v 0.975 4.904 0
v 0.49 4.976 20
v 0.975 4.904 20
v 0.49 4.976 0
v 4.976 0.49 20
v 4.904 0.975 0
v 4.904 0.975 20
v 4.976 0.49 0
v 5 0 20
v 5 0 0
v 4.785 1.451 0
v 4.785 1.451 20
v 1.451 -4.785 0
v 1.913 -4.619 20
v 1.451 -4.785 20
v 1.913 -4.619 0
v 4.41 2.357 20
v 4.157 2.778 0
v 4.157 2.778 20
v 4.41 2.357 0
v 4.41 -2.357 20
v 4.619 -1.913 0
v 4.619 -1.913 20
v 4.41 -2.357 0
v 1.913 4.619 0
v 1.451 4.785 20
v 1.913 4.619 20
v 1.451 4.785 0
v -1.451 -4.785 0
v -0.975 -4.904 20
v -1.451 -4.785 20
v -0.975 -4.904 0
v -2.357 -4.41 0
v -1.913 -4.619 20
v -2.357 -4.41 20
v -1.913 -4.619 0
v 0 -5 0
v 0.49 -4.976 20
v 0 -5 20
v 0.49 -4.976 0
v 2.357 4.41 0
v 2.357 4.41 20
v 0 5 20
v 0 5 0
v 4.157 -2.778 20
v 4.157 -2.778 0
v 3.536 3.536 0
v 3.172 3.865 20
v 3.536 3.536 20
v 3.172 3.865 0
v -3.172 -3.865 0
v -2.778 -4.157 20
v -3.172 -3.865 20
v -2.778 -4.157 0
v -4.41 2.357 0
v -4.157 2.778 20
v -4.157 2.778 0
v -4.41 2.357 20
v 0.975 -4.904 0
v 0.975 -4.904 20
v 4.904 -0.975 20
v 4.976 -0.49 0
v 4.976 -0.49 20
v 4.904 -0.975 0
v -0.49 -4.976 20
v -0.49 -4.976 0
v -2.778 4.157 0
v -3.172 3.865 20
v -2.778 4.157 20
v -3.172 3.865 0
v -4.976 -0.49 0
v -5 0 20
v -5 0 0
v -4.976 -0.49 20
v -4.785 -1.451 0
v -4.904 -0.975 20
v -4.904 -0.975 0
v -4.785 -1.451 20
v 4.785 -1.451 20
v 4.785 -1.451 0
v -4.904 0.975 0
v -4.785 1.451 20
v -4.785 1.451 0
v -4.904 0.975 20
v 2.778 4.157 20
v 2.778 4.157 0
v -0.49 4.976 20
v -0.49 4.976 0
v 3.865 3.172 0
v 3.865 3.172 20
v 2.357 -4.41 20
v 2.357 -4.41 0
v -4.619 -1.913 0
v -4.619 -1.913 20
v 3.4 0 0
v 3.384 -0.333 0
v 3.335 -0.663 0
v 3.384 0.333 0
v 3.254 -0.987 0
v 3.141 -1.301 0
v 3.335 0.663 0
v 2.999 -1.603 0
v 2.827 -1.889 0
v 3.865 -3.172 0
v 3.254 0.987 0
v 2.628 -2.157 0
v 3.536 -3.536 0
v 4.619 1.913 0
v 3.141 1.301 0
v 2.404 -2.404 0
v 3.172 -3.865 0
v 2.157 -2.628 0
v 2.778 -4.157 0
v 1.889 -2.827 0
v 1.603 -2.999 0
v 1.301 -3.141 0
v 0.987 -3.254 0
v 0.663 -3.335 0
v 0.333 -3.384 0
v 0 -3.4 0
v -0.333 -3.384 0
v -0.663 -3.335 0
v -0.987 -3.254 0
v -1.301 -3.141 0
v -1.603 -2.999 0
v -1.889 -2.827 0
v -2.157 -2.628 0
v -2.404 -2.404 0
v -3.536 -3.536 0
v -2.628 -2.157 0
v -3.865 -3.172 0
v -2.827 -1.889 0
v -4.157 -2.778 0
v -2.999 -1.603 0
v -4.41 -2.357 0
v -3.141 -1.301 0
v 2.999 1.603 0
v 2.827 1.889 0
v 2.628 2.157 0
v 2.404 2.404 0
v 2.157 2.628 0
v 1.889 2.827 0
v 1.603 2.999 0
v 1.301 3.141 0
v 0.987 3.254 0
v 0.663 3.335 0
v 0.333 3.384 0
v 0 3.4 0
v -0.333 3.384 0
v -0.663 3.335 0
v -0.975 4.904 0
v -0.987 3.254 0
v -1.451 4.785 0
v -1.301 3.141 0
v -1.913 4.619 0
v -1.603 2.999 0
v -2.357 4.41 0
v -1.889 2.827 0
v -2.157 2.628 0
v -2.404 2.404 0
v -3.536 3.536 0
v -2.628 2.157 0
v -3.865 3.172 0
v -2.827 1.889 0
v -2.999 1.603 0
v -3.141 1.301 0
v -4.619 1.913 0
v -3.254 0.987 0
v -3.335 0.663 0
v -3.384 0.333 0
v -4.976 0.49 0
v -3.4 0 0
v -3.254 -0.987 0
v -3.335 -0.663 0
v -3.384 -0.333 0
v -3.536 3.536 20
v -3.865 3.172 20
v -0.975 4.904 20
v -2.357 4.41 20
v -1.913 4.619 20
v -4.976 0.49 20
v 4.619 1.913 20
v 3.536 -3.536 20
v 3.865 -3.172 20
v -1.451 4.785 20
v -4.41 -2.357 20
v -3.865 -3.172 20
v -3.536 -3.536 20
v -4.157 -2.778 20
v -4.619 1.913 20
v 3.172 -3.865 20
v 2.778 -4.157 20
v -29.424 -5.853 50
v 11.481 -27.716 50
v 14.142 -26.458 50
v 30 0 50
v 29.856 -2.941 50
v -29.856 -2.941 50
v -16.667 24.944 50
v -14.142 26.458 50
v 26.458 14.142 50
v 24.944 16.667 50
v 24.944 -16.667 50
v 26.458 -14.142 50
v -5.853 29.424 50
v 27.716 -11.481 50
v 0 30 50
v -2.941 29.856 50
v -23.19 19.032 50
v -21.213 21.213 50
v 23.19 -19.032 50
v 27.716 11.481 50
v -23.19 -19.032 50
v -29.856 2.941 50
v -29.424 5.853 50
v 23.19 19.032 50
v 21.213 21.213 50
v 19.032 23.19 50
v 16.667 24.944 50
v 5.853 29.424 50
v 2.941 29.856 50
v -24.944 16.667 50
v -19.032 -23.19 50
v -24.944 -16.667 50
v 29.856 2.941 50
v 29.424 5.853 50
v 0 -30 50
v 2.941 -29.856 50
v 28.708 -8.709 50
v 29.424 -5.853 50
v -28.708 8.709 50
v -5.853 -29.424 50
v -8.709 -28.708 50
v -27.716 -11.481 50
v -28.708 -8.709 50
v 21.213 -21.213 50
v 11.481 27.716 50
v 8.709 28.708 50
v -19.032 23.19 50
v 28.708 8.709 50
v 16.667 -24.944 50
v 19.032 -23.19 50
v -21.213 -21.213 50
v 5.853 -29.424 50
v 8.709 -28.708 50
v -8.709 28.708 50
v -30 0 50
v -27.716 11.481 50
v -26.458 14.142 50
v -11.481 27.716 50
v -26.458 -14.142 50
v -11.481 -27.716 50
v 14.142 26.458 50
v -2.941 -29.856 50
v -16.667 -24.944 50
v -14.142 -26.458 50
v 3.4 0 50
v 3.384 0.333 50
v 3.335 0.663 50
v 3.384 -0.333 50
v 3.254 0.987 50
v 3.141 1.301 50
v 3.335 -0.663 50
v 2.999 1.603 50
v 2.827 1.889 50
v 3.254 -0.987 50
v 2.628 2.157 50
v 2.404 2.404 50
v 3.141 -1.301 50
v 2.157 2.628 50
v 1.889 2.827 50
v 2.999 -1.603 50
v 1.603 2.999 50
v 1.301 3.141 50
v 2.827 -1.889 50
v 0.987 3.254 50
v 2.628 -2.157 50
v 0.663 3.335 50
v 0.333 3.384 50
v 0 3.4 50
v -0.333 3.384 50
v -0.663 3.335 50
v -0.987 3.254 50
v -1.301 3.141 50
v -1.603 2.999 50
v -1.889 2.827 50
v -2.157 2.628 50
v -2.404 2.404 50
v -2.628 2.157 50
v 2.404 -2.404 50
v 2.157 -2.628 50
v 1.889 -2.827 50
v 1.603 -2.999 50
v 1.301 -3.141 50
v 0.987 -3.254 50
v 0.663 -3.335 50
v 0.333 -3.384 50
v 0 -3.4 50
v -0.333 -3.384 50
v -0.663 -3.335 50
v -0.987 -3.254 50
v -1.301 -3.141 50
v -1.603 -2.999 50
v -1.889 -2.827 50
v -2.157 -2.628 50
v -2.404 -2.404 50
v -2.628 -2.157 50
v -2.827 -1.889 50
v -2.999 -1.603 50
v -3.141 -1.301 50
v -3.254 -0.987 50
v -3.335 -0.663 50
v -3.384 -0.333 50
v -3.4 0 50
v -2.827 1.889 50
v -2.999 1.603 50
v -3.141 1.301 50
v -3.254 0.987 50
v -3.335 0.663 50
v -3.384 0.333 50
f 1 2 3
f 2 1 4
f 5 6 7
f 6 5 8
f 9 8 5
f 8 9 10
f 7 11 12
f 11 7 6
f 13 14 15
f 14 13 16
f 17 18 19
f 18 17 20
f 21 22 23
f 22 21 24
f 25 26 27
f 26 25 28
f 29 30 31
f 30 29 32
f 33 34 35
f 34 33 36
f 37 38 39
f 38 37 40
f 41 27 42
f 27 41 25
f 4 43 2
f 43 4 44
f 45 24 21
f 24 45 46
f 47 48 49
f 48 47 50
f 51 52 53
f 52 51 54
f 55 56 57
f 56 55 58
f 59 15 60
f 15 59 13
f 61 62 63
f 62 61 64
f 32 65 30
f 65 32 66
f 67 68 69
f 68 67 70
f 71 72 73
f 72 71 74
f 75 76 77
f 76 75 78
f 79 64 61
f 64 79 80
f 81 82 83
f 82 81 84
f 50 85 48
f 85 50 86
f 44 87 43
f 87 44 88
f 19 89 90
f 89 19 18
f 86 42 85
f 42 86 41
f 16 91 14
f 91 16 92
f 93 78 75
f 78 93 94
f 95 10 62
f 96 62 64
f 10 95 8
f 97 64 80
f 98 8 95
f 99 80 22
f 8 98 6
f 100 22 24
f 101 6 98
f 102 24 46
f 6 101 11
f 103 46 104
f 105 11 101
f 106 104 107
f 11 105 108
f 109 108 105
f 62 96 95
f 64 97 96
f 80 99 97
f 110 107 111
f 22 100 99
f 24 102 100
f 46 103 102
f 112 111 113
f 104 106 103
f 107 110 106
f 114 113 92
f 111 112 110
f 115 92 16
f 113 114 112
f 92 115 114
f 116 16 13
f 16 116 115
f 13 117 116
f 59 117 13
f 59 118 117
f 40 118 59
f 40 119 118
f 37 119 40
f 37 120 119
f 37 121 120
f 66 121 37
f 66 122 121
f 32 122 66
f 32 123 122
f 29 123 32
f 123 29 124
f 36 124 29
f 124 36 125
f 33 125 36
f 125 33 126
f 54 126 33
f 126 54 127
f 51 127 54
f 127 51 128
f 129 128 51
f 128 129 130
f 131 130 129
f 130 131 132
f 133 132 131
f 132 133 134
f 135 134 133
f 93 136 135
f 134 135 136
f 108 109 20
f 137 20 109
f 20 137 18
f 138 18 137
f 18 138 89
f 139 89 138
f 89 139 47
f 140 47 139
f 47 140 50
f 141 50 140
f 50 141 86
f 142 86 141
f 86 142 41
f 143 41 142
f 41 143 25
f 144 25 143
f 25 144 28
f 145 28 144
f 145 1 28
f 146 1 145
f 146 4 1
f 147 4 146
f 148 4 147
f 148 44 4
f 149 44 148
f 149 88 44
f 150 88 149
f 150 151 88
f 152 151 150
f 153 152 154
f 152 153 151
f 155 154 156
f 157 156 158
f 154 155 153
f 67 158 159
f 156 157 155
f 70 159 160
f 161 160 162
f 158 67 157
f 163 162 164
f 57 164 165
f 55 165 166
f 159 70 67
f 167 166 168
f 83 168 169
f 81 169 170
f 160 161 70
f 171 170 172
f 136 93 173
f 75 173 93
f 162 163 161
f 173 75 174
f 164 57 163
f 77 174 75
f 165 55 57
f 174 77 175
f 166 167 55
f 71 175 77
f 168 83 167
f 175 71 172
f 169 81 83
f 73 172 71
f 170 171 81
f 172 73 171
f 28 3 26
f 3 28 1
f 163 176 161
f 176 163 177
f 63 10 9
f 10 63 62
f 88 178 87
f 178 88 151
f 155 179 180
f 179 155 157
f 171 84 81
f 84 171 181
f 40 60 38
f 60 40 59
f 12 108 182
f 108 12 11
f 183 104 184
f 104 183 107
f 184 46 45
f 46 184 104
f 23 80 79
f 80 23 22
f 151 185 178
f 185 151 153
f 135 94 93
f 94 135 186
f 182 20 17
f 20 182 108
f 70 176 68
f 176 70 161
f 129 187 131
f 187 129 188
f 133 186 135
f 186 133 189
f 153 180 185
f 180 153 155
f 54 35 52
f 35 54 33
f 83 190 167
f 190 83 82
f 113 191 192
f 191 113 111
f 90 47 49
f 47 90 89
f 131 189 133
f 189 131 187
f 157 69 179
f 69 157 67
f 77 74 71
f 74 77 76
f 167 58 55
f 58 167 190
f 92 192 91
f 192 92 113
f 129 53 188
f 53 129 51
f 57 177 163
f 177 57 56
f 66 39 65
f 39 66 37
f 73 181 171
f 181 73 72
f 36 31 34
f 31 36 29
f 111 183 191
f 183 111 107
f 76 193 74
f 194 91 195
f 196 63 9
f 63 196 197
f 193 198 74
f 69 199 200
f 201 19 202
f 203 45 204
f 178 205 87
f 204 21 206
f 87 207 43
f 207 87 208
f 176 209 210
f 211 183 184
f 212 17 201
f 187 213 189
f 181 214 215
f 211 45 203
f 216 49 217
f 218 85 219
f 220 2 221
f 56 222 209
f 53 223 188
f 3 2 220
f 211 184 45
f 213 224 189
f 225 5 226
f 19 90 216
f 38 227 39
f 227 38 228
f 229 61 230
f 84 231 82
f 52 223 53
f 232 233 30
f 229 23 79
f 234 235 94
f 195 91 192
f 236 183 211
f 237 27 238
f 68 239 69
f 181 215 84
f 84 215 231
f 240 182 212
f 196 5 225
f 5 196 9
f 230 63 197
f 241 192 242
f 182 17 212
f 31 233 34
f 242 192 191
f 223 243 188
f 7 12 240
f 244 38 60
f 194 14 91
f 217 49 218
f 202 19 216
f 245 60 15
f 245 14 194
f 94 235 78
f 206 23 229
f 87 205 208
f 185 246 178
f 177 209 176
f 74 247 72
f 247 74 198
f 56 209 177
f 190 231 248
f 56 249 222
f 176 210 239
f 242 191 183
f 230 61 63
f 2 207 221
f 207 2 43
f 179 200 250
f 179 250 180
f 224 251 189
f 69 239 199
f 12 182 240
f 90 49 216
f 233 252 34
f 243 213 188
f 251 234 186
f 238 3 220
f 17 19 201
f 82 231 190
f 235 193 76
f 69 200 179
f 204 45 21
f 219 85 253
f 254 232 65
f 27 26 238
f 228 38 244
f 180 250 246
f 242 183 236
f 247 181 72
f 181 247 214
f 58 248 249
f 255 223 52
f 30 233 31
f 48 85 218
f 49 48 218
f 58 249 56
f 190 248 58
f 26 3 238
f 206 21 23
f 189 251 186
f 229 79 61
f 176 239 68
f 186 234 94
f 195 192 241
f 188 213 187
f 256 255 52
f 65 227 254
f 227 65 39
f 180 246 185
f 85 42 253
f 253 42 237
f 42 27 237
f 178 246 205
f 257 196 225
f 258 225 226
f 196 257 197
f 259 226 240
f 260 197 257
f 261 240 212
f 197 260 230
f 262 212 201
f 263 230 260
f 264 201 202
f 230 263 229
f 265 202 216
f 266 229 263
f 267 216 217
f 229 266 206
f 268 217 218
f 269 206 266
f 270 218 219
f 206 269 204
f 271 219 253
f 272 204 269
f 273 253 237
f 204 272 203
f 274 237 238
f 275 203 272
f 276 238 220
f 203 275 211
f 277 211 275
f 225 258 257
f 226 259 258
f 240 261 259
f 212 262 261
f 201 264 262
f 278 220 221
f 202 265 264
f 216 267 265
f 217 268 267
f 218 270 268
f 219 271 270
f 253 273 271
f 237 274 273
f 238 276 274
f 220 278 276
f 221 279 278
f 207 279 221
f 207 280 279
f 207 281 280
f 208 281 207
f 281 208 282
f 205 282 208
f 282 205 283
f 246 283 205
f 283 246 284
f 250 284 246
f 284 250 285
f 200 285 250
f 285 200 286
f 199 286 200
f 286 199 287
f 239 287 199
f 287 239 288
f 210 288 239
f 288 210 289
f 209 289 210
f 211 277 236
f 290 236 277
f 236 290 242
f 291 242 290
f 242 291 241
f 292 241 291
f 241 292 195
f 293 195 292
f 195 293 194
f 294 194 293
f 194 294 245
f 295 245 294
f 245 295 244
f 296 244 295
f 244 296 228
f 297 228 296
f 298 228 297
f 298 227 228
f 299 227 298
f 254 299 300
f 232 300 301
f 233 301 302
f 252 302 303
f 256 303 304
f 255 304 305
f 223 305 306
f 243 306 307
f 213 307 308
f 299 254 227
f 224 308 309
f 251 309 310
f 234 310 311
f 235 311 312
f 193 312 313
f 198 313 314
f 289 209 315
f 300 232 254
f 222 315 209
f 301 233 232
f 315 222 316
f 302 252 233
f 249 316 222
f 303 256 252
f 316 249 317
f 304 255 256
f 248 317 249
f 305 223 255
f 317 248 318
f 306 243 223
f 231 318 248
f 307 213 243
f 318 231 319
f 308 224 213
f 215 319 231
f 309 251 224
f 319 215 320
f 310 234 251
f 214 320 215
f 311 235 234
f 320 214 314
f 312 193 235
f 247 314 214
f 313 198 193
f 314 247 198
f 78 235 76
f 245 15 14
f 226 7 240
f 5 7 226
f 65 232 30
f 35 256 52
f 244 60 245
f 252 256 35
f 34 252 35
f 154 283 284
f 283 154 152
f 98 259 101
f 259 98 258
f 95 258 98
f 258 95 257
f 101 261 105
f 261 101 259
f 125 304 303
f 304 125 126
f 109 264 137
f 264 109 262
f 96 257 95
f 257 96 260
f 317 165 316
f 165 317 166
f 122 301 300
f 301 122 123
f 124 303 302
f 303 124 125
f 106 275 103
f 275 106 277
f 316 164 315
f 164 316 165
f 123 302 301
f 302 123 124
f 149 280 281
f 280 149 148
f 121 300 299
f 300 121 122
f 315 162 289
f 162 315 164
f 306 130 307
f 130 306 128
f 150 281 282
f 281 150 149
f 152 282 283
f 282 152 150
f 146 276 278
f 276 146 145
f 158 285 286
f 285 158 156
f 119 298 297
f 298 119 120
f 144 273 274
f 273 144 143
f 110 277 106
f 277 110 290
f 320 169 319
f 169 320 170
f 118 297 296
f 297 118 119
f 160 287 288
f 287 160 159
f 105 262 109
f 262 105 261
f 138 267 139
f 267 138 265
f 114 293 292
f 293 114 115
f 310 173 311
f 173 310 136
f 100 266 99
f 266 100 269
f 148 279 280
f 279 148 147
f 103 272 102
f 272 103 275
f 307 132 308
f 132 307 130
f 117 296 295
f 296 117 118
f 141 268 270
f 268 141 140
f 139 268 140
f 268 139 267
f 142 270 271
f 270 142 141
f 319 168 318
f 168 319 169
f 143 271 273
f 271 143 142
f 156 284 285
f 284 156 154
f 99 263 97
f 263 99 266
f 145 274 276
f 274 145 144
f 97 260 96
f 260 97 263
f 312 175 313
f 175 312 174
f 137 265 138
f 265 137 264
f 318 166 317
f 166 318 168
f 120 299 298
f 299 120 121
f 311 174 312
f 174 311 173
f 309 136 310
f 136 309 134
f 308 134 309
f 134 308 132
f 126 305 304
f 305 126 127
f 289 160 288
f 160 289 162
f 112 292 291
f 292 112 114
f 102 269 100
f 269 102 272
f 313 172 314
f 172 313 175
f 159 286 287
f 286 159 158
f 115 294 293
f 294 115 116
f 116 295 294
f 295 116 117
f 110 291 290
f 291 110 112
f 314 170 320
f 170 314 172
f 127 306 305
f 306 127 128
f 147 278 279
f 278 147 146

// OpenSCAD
// Funnel - a spout (tube) sitting below a conical section, open at both ends for fluid flow.
// NOVEL general part for a lab or craft. DO NOT use in contact with skin or food.
//

spout_d = 10;
spout_l = 20;
cone_d1 = 10;
cone_d2 = 60;
wall    = 1.6;

$fn = 64;

ib = spout_d - 2 * wall;   // spout bore
ic = cone_d1 - 2 * wall;   // cone inner diameter at the spout top

difference() {
    union() {
        cylinder(h = spout_l, d = spout_d);                 // spout
        translate([0, 0, spout_l]) cylinder(h = 30, d1 = cone_d1, d2 = cone_d2);  // cone above
    }
    translate([0, 0, -1]) cylinder(h = spout_l + 2, d = ib);                     // bore through spout
    translate([0, 0, spout_l]) cylinder(h = 31, d = ic);                         // inner cone surface (open top)
}
